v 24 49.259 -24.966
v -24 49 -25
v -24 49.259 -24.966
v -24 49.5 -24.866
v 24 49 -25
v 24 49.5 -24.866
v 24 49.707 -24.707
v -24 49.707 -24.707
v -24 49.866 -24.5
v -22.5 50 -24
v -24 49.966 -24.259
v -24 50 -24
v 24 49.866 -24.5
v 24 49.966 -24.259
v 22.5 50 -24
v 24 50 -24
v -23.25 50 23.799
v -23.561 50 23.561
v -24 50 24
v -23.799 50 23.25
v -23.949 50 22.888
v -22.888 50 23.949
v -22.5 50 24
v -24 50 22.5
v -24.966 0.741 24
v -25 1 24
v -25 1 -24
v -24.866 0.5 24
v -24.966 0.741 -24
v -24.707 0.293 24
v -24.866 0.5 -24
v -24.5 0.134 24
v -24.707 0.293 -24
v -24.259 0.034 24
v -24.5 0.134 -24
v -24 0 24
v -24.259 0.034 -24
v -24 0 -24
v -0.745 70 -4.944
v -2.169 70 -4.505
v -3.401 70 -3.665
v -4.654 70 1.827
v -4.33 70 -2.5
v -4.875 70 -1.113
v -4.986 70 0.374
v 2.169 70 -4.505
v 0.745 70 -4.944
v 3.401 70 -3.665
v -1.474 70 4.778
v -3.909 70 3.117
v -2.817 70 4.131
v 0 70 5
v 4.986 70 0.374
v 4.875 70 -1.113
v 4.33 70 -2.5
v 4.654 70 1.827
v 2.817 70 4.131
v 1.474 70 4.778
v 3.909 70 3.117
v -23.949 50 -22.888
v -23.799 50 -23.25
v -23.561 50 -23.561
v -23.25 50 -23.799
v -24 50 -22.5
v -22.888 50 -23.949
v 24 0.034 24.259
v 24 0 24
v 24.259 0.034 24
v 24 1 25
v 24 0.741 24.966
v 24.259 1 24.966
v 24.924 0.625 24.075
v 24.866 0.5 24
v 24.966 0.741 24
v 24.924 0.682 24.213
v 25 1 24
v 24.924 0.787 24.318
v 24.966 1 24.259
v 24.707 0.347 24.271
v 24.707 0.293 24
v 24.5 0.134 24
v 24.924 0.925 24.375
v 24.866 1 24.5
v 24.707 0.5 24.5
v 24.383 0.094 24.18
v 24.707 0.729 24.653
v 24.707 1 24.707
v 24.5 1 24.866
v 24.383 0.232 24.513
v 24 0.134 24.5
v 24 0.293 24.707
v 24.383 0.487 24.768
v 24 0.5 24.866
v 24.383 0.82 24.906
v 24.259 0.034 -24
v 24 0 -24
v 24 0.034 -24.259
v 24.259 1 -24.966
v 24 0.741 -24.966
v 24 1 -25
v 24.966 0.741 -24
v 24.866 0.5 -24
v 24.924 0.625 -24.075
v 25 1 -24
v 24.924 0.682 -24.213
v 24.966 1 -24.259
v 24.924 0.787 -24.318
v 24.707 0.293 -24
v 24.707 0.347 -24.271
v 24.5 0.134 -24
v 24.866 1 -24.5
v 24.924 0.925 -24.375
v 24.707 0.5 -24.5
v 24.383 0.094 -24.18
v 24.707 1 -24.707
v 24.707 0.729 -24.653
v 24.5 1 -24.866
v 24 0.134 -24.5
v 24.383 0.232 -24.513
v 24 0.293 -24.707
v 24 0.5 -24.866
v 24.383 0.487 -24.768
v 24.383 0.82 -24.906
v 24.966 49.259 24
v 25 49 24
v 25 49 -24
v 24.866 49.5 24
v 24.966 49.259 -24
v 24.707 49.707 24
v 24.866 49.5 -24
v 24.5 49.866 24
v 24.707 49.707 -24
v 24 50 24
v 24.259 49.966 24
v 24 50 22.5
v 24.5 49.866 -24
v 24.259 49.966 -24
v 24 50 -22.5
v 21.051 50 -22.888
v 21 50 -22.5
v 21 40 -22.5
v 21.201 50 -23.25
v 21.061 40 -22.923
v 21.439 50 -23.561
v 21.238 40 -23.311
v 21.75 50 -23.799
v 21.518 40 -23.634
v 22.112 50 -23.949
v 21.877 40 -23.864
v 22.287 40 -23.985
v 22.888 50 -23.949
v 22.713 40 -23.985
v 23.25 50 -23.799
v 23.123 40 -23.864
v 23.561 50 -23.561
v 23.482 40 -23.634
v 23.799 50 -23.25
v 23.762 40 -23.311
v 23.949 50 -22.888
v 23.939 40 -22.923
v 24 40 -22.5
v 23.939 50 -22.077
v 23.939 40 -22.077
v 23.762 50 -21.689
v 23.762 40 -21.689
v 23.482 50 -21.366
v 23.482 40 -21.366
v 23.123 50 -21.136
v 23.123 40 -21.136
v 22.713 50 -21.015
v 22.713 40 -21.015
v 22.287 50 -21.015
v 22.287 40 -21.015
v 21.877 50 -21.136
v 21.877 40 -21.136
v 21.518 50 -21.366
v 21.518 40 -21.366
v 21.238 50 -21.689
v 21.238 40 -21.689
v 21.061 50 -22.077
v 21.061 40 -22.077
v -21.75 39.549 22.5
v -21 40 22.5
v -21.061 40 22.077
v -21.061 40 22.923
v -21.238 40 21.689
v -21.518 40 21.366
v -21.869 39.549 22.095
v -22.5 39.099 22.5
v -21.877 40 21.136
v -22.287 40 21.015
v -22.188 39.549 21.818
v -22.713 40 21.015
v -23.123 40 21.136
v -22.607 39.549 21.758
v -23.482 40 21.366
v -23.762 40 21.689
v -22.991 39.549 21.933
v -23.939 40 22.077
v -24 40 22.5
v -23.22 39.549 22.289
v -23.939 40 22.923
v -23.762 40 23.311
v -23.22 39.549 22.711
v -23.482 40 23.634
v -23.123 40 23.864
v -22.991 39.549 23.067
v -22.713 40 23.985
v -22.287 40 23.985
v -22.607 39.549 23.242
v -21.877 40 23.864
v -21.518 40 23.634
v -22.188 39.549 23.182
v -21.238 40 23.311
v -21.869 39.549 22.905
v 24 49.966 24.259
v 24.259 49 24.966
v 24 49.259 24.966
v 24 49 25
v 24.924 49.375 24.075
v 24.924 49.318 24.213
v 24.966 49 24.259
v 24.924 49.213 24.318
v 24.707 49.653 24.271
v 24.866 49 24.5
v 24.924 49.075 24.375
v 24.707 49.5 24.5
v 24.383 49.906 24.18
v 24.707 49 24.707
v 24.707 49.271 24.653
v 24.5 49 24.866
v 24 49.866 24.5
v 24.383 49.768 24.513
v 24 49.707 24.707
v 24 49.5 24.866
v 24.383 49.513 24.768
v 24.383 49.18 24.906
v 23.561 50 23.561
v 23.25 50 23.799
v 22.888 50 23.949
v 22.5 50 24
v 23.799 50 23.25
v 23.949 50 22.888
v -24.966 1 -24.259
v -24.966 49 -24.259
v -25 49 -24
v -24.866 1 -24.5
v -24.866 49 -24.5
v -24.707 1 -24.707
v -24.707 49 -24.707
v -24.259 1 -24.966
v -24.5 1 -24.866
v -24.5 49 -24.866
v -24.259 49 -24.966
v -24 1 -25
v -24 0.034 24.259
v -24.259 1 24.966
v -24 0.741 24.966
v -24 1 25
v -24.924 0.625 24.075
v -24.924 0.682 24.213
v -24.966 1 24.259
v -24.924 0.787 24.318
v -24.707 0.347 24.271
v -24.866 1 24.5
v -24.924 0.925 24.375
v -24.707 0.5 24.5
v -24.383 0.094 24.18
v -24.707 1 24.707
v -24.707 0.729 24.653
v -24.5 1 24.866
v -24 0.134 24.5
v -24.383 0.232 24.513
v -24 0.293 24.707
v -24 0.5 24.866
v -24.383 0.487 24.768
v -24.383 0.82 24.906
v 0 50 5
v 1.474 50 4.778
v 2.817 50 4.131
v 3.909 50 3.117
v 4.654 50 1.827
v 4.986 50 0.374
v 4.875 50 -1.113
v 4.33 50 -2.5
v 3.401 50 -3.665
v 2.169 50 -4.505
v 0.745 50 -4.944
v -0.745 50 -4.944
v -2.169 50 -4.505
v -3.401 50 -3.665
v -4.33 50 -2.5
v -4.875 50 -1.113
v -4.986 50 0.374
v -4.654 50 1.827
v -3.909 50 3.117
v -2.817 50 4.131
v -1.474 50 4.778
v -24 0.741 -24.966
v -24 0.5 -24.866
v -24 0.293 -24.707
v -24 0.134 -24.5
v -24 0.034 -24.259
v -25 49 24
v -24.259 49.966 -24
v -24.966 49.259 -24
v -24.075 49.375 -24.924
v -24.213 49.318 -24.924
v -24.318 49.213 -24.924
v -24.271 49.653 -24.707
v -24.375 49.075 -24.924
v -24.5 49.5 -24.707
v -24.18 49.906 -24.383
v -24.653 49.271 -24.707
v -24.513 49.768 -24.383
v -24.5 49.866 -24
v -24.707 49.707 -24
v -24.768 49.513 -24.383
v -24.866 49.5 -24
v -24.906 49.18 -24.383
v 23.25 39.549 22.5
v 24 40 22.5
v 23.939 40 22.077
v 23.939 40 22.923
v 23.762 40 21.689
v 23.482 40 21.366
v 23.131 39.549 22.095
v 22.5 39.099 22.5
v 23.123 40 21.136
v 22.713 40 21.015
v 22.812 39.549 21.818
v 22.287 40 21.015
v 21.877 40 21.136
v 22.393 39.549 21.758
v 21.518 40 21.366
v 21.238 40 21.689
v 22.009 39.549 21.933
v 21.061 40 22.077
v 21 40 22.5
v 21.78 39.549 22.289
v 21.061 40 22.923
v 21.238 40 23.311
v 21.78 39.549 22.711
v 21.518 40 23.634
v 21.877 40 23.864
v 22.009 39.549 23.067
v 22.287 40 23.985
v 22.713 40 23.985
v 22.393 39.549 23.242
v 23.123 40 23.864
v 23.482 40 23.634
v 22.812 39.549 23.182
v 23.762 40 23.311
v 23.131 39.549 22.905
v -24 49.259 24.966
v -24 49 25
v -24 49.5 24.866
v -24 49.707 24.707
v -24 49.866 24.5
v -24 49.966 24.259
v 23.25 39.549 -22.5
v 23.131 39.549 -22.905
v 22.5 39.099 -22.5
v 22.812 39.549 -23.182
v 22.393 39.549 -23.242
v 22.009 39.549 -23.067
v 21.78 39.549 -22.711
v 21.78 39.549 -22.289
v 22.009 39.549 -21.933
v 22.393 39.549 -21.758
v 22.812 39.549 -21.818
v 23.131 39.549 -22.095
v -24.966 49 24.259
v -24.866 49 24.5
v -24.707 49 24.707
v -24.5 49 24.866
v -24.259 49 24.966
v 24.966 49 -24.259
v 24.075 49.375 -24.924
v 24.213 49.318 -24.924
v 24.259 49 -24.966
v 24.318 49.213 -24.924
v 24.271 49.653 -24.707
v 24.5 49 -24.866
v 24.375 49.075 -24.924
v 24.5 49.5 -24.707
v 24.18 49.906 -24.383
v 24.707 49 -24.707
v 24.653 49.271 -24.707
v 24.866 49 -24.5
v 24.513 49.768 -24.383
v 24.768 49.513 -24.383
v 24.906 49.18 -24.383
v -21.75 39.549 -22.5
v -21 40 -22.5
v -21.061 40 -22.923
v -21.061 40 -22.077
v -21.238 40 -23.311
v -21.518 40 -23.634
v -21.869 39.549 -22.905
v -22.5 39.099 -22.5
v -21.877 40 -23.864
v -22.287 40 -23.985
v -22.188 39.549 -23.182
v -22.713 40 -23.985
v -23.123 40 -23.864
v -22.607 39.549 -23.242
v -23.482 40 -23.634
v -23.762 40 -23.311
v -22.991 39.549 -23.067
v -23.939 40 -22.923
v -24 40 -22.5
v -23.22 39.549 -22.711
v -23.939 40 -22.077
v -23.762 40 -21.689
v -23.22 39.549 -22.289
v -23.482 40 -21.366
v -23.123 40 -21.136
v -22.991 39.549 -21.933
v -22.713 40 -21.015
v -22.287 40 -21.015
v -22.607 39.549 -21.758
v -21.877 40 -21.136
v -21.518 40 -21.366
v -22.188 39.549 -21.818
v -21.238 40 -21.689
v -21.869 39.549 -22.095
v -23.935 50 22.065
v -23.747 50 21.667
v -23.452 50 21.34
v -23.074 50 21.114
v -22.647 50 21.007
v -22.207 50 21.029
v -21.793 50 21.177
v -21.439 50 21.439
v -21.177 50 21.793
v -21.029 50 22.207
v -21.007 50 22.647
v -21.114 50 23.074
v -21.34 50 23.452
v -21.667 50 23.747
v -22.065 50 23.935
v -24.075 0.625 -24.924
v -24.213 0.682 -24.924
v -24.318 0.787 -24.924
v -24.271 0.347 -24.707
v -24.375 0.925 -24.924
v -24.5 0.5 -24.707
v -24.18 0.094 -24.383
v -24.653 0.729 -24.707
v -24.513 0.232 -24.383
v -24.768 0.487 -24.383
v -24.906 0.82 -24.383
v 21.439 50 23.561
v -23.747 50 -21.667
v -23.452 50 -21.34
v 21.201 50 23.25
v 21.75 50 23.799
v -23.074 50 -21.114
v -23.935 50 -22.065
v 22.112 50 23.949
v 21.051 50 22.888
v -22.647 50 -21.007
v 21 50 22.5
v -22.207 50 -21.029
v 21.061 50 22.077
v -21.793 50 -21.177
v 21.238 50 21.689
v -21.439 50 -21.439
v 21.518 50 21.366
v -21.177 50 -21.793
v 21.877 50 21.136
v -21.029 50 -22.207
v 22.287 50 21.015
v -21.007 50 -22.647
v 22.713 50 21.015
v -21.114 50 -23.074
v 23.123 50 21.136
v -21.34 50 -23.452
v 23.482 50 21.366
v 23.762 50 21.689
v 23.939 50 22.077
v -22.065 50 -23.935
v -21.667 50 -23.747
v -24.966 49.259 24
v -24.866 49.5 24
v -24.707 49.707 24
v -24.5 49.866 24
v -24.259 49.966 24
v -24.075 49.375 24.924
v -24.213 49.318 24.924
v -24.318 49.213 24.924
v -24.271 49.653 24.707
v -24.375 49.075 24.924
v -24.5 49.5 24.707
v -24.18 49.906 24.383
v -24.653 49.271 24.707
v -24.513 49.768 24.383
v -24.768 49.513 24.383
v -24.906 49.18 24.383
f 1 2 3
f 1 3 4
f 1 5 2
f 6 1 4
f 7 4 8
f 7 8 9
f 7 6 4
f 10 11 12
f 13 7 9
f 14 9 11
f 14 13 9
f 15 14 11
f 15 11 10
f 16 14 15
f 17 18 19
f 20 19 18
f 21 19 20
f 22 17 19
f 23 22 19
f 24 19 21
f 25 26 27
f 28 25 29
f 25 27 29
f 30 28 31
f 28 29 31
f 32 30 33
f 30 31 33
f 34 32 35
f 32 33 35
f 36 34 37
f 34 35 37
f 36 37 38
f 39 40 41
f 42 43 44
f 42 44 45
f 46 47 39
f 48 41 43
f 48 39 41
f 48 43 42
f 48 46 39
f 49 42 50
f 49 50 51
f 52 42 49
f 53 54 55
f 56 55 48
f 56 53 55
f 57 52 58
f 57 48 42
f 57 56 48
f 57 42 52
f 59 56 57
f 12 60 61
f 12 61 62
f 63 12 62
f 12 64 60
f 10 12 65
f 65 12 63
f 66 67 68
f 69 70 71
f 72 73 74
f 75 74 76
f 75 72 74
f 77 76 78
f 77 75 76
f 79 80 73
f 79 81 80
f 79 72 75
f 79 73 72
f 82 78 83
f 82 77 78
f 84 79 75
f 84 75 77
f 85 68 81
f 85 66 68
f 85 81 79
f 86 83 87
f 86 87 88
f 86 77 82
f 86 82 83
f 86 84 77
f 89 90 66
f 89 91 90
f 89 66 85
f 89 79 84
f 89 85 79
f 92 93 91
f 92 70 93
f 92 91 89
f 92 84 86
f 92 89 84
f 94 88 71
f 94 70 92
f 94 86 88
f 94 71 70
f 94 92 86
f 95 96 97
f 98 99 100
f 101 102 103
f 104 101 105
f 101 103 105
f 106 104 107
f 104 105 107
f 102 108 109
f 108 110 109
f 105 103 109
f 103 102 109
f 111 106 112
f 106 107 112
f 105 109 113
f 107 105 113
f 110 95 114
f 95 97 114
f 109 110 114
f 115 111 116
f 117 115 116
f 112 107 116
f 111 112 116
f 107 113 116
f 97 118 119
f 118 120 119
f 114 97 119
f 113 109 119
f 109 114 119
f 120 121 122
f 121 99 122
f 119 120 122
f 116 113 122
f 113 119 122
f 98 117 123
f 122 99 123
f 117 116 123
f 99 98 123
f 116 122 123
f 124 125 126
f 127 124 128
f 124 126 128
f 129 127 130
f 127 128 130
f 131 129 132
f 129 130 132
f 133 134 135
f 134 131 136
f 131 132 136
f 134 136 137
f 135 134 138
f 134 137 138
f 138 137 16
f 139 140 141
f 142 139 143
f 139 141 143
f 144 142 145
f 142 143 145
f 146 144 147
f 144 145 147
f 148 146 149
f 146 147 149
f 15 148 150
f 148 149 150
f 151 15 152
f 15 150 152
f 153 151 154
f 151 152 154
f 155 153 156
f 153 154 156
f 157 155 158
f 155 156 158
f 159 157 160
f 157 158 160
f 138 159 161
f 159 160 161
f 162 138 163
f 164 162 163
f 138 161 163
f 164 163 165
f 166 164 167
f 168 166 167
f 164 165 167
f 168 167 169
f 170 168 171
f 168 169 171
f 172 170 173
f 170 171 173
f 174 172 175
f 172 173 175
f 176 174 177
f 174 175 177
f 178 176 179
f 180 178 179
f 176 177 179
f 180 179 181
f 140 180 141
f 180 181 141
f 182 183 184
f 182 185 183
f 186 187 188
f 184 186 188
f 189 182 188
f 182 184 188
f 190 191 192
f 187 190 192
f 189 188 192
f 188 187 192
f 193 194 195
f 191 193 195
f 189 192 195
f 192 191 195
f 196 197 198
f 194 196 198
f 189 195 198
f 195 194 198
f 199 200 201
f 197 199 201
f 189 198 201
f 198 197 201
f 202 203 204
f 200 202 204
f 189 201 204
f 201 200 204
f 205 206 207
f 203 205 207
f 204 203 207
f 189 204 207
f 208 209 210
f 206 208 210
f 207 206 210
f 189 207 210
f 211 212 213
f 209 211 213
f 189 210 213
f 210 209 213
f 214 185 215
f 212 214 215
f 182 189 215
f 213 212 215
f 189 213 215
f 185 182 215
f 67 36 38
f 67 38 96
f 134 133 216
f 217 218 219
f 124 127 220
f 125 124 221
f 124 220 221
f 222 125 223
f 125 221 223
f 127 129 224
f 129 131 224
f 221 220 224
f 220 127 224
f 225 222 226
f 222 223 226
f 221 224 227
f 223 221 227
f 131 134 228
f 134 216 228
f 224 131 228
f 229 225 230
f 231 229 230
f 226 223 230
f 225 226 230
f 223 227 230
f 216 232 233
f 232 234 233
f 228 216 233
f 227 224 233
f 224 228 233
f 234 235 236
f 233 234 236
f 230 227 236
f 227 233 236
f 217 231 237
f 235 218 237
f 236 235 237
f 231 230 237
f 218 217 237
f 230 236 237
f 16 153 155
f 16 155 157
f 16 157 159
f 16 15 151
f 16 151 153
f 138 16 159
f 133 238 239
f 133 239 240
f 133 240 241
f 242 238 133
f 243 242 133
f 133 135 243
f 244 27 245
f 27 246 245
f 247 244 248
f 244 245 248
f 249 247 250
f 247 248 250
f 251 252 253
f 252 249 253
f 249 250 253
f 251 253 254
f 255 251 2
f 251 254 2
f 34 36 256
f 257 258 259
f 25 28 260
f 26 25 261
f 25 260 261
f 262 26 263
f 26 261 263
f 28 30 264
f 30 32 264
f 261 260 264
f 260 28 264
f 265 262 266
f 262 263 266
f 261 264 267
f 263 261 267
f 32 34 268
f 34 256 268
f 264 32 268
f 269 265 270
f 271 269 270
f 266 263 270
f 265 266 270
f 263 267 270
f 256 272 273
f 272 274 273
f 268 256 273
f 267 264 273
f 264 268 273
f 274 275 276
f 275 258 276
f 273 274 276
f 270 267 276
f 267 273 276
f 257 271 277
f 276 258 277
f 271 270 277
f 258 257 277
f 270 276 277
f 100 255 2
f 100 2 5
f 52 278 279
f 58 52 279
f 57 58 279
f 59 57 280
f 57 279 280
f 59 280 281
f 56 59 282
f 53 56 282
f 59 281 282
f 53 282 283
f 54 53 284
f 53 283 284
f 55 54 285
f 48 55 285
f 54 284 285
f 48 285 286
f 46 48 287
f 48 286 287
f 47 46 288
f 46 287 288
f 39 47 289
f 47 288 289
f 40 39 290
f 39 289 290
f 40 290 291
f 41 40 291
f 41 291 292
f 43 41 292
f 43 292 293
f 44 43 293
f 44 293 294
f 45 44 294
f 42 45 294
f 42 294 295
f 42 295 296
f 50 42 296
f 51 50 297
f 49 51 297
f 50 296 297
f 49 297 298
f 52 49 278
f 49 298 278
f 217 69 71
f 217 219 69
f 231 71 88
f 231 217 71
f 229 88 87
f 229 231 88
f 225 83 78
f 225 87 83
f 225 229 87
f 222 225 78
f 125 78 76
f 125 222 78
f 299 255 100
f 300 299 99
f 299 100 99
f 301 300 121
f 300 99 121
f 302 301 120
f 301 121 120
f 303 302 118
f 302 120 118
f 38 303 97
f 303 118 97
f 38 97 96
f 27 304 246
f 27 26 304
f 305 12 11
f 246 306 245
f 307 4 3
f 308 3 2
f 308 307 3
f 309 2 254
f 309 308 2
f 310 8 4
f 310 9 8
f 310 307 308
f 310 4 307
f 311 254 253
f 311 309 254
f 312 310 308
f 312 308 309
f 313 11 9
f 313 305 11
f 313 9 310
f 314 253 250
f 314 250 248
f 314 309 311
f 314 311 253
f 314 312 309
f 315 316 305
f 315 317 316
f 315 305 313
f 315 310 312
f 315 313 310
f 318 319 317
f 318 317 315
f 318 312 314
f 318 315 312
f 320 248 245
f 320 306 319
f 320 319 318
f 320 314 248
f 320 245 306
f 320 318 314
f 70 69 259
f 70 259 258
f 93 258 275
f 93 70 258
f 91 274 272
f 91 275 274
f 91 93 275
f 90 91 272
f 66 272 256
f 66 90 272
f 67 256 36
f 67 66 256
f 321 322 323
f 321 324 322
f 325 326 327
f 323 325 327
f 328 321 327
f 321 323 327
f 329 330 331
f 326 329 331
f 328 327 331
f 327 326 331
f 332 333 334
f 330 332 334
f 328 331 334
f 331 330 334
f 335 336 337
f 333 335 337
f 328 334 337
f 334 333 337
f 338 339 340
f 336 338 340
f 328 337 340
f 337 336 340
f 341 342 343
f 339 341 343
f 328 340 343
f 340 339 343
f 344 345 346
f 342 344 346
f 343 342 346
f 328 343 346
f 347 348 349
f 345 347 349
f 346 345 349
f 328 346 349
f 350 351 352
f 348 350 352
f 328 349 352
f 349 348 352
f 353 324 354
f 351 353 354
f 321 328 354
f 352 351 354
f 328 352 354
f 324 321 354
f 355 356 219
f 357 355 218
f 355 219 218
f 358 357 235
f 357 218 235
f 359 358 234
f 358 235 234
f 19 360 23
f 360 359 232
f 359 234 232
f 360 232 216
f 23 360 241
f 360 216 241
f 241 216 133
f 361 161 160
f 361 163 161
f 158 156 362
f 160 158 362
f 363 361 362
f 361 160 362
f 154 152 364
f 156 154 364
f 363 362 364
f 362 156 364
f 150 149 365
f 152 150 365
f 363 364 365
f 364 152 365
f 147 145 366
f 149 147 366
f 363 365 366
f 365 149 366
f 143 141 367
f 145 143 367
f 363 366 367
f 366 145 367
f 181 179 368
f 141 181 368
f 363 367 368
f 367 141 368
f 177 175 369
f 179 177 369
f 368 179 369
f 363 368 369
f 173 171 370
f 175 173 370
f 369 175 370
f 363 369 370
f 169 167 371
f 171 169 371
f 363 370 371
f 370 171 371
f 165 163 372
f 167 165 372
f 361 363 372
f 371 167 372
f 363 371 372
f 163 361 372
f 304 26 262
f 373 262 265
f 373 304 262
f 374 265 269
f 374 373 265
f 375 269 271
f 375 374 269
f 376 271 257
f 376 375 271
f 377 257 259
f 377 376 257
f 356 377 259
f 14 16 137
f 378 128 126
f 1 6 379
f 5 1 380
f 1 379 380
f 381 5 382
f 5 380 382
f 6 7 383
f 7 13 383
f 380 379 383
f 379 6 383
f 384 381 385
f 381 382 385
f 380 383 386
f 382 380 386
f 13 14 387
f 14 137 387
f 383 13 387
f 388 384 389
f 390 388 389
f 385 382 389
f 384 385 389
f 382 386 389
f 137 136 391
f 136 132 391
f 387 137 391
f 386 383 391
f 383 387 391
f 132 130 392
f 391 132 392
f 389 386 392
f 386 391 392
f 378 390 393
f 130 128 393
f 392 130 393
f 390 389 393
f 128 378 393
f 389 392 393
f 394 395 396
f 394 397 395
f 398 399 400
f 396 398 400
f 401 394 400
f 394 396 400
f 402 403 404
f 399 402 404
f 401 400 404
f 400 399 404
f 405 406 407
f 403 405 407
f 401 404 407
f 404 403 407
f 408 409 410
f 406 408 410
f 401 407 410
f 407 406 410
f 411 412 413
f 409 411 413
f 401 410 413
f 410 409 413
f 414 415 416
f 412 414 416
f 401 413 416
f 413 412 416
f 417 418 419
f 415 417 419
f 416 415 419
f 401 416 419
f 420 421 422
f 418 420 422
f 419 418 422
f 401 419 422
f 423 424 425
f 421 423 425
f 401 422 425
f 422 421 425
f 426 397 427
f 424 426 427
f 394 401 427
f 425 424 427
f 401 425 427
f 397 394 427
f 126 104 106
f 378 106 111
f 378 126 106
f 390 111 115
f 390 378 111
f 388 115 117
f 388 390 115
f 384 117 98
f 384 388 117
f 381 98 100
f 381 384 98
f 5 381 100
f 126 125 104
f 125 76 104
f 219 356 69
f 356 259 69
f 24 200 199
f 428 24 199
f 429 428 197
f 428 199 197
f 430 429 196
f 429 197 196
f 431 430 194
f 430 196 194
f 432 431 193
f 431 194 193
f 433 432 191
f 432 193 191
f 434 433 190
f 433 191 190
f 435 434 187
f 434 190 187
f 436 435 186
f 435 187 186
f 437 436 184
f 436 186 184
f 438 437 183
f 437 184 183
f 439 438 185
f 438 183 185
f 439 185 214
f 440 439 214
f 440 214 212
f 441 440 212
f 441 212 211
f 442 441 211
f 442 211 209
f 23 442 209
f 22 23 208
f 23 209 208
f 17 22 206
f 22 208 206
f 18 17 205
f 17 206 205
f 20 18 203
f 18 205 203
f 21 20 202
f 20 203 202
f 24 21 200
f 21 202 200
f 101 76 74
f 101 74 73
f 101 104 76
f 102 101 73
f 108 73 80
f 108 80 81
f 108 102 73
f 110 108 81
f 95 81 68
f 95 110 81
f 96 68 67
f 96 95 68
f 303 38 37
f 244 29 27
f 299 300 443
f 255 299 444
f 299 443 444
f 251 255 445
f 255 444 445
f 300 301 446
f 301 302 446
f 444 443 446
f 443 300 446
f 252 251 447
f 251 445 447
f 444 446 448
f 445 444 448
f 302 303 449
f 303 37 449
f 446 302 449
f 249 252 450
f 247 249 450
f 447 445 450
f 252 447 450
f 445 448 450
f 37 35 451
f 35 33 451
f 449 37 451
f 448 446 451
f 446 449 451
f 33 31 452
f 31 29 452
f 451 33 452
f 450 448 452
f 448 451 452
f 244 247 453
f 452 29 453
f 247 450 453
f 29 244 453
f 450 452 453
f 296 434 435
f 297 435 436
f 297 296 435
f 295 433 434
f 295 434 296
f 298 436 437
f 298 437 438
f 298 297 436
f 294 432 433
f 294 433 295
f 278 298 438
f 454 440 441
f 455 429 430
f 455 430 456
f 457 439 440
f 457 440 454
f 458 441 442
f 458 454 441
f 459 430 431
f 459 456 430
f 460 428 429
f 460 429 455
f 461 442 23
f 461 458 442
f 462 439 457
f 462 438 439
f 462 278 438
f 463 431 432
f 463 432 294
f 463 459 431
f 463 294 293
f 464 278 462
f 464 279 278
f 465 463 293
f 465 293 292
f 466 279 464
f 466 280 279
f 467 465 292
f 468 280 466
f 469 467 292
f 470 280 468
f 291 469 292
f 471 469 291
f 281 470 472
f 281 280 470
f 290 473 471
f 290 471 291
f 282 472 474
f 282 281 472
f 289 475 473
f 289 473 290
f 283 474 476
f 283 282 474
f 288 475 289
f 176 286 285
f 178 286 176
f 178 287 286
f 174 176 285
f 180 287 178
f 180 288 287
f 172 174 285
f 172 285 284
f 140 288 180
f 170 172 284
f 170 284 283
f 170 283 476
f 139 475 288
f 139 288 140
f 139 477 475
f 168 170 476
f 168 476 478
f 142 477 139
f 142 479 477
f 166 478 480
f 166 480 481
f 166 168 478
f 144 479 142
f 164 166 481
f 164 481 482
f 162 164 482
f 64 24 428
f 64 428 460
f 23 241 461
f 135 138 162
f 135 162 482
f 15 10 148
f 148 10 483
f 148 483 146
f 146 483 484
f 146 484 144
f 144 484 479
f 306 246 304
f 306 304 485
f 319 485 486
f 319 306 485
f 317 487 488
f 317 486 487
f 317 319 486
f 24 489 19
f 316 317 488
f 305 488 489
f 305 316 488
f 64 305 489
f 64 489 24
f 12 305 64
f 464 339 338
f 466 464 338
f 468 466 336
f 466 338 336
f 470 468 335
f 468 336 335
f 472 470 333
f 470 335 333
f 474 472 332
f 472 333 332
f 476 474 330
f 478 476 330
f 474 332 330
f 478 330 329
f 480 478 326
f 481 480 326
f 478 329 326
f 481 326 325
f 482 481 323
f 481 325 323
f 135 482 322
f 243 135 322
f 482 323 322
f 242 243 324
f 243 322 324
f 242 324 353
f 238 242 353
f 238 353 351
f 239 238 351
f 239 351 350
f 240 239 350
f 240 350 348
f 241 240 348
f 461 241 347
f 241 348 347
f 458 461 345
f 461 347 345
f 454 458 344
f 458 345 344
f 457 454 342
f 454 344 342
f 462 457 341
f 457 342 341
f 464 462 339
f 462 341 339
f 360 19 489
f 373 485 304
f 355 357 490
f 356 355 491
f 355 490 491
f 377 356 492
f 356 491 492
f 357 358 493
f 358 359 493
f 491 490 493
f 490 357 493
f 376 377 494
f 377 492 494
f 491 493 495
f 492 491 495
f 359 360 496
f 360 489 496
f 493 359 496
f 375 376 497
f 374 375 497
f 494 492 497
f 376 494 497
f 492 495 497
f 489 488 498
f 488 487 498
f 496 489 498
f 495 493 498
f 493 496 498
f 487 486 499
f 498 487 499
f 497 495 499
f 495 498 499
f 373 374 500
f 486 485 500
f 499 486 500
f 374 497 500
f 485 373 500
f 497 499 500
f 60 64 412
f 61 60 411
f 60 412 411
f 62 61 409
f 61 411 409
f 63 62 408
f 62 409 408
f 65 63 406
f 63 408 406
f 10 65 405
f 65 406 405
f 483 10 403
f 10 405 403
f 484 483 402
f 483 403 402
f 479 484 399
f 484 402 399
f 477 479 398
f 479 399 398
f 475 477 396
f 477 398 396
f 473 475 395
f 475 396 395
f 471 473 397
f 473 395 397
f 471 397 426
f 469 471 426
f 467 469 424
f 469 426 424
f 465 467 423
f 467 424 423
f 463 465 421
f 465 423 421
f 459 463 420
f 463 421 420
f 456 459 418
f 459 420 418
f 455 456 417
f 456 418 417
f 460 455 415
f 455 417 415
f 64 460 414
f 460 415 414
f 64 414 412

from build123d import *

# Parameters (mm, degrees)
SKETCH1_W                 = 50
SKETCH1_H                 = 50
BOSS_EXTRUDE1_DEPTH       = 50
FILLET1_R                 = 1
F_3_0MM_DOWEL_HOLE1_D     = 3
F_3_0MM_DOWEL_HOLE1_DEPTH = 10
F_3_0MM_DOWEL_HOLE1_TIP   = 0.901290929
SKETCH5_R                 = 5
BOSS_EXTRUDE2_DEPTH       = 20


with BuildPart() as part:
    # Sketch1 → Boss-Extrude1 (new body)
    with BuildSketch(Plane(origin=(0, 0, 0), x_dir=(1, 0, 0), z_dir=(0, 1, 0))):
        Rectangle(SKETCH1_W, SKETCH1_H)
    extrude(amount=BOSS_EXTRUDE1_DEPTH)

    # Fillet1
    fillet1_edges = [part.edges().sort_by_distance(p)[0] for p in [
        (-25, 50, 0),
        (0, 50, 25),
        (25, 50, 0),
        (0, 0, 25),
        (-25, 0, 0),
        (0, 0, -25),
        (25, 0, 0),
        (0, 50, -25),
        (25, 25, 25),
        (-25, 25, 25),
        (-25, 25, -25),
        (25, 25, -25),
    ]]
    fillet(fillet1_edges, radius=FILLET1_R)

    # Ø3.0mm Dowel Hole1
    with Locations(Plane(origin=(0, 50, 0), x_dir=(1, 0, 0), z_dir=(0, 1, 0))):
        with Locations((-22.5, 22.5), (22.5, 22.5), (22.5, -22.5), (-22.5, -22.5)):
            Hole(F_3_0MM_DOWEL_HOLE1_D / 2, depth=F_3_0MM_DOWEL_HOLE1_DEPTH)
            with Locations((0, 0, -(F_3_0MM_DOWEL_HOLE1_DEPTH + F_3_0MM_DOWEL_HOLE1_TIP / 2))):  # 118° drill point
                Cone(0, F_3_0MM_DOWEL_HOLE1_D / 2, F_3_0MM_DOWEL_HOLE1_TIP, mode=Mode.SUBTRACT)

    # Sketch5 → Boss-Extrude2 (add)
    with BuildSketch(Plane(origin=(0, 50, 0), x_dir=(1, 0, 0), z_dir=(0, 1, 0))):
        with Locations(Location((0, 0, 0), (0, 0, 270))):
            Circle(SKETCH5_R)
    extrude(amount=BOSS_EXTRUDE2_DEPTH)


solid = part.part
